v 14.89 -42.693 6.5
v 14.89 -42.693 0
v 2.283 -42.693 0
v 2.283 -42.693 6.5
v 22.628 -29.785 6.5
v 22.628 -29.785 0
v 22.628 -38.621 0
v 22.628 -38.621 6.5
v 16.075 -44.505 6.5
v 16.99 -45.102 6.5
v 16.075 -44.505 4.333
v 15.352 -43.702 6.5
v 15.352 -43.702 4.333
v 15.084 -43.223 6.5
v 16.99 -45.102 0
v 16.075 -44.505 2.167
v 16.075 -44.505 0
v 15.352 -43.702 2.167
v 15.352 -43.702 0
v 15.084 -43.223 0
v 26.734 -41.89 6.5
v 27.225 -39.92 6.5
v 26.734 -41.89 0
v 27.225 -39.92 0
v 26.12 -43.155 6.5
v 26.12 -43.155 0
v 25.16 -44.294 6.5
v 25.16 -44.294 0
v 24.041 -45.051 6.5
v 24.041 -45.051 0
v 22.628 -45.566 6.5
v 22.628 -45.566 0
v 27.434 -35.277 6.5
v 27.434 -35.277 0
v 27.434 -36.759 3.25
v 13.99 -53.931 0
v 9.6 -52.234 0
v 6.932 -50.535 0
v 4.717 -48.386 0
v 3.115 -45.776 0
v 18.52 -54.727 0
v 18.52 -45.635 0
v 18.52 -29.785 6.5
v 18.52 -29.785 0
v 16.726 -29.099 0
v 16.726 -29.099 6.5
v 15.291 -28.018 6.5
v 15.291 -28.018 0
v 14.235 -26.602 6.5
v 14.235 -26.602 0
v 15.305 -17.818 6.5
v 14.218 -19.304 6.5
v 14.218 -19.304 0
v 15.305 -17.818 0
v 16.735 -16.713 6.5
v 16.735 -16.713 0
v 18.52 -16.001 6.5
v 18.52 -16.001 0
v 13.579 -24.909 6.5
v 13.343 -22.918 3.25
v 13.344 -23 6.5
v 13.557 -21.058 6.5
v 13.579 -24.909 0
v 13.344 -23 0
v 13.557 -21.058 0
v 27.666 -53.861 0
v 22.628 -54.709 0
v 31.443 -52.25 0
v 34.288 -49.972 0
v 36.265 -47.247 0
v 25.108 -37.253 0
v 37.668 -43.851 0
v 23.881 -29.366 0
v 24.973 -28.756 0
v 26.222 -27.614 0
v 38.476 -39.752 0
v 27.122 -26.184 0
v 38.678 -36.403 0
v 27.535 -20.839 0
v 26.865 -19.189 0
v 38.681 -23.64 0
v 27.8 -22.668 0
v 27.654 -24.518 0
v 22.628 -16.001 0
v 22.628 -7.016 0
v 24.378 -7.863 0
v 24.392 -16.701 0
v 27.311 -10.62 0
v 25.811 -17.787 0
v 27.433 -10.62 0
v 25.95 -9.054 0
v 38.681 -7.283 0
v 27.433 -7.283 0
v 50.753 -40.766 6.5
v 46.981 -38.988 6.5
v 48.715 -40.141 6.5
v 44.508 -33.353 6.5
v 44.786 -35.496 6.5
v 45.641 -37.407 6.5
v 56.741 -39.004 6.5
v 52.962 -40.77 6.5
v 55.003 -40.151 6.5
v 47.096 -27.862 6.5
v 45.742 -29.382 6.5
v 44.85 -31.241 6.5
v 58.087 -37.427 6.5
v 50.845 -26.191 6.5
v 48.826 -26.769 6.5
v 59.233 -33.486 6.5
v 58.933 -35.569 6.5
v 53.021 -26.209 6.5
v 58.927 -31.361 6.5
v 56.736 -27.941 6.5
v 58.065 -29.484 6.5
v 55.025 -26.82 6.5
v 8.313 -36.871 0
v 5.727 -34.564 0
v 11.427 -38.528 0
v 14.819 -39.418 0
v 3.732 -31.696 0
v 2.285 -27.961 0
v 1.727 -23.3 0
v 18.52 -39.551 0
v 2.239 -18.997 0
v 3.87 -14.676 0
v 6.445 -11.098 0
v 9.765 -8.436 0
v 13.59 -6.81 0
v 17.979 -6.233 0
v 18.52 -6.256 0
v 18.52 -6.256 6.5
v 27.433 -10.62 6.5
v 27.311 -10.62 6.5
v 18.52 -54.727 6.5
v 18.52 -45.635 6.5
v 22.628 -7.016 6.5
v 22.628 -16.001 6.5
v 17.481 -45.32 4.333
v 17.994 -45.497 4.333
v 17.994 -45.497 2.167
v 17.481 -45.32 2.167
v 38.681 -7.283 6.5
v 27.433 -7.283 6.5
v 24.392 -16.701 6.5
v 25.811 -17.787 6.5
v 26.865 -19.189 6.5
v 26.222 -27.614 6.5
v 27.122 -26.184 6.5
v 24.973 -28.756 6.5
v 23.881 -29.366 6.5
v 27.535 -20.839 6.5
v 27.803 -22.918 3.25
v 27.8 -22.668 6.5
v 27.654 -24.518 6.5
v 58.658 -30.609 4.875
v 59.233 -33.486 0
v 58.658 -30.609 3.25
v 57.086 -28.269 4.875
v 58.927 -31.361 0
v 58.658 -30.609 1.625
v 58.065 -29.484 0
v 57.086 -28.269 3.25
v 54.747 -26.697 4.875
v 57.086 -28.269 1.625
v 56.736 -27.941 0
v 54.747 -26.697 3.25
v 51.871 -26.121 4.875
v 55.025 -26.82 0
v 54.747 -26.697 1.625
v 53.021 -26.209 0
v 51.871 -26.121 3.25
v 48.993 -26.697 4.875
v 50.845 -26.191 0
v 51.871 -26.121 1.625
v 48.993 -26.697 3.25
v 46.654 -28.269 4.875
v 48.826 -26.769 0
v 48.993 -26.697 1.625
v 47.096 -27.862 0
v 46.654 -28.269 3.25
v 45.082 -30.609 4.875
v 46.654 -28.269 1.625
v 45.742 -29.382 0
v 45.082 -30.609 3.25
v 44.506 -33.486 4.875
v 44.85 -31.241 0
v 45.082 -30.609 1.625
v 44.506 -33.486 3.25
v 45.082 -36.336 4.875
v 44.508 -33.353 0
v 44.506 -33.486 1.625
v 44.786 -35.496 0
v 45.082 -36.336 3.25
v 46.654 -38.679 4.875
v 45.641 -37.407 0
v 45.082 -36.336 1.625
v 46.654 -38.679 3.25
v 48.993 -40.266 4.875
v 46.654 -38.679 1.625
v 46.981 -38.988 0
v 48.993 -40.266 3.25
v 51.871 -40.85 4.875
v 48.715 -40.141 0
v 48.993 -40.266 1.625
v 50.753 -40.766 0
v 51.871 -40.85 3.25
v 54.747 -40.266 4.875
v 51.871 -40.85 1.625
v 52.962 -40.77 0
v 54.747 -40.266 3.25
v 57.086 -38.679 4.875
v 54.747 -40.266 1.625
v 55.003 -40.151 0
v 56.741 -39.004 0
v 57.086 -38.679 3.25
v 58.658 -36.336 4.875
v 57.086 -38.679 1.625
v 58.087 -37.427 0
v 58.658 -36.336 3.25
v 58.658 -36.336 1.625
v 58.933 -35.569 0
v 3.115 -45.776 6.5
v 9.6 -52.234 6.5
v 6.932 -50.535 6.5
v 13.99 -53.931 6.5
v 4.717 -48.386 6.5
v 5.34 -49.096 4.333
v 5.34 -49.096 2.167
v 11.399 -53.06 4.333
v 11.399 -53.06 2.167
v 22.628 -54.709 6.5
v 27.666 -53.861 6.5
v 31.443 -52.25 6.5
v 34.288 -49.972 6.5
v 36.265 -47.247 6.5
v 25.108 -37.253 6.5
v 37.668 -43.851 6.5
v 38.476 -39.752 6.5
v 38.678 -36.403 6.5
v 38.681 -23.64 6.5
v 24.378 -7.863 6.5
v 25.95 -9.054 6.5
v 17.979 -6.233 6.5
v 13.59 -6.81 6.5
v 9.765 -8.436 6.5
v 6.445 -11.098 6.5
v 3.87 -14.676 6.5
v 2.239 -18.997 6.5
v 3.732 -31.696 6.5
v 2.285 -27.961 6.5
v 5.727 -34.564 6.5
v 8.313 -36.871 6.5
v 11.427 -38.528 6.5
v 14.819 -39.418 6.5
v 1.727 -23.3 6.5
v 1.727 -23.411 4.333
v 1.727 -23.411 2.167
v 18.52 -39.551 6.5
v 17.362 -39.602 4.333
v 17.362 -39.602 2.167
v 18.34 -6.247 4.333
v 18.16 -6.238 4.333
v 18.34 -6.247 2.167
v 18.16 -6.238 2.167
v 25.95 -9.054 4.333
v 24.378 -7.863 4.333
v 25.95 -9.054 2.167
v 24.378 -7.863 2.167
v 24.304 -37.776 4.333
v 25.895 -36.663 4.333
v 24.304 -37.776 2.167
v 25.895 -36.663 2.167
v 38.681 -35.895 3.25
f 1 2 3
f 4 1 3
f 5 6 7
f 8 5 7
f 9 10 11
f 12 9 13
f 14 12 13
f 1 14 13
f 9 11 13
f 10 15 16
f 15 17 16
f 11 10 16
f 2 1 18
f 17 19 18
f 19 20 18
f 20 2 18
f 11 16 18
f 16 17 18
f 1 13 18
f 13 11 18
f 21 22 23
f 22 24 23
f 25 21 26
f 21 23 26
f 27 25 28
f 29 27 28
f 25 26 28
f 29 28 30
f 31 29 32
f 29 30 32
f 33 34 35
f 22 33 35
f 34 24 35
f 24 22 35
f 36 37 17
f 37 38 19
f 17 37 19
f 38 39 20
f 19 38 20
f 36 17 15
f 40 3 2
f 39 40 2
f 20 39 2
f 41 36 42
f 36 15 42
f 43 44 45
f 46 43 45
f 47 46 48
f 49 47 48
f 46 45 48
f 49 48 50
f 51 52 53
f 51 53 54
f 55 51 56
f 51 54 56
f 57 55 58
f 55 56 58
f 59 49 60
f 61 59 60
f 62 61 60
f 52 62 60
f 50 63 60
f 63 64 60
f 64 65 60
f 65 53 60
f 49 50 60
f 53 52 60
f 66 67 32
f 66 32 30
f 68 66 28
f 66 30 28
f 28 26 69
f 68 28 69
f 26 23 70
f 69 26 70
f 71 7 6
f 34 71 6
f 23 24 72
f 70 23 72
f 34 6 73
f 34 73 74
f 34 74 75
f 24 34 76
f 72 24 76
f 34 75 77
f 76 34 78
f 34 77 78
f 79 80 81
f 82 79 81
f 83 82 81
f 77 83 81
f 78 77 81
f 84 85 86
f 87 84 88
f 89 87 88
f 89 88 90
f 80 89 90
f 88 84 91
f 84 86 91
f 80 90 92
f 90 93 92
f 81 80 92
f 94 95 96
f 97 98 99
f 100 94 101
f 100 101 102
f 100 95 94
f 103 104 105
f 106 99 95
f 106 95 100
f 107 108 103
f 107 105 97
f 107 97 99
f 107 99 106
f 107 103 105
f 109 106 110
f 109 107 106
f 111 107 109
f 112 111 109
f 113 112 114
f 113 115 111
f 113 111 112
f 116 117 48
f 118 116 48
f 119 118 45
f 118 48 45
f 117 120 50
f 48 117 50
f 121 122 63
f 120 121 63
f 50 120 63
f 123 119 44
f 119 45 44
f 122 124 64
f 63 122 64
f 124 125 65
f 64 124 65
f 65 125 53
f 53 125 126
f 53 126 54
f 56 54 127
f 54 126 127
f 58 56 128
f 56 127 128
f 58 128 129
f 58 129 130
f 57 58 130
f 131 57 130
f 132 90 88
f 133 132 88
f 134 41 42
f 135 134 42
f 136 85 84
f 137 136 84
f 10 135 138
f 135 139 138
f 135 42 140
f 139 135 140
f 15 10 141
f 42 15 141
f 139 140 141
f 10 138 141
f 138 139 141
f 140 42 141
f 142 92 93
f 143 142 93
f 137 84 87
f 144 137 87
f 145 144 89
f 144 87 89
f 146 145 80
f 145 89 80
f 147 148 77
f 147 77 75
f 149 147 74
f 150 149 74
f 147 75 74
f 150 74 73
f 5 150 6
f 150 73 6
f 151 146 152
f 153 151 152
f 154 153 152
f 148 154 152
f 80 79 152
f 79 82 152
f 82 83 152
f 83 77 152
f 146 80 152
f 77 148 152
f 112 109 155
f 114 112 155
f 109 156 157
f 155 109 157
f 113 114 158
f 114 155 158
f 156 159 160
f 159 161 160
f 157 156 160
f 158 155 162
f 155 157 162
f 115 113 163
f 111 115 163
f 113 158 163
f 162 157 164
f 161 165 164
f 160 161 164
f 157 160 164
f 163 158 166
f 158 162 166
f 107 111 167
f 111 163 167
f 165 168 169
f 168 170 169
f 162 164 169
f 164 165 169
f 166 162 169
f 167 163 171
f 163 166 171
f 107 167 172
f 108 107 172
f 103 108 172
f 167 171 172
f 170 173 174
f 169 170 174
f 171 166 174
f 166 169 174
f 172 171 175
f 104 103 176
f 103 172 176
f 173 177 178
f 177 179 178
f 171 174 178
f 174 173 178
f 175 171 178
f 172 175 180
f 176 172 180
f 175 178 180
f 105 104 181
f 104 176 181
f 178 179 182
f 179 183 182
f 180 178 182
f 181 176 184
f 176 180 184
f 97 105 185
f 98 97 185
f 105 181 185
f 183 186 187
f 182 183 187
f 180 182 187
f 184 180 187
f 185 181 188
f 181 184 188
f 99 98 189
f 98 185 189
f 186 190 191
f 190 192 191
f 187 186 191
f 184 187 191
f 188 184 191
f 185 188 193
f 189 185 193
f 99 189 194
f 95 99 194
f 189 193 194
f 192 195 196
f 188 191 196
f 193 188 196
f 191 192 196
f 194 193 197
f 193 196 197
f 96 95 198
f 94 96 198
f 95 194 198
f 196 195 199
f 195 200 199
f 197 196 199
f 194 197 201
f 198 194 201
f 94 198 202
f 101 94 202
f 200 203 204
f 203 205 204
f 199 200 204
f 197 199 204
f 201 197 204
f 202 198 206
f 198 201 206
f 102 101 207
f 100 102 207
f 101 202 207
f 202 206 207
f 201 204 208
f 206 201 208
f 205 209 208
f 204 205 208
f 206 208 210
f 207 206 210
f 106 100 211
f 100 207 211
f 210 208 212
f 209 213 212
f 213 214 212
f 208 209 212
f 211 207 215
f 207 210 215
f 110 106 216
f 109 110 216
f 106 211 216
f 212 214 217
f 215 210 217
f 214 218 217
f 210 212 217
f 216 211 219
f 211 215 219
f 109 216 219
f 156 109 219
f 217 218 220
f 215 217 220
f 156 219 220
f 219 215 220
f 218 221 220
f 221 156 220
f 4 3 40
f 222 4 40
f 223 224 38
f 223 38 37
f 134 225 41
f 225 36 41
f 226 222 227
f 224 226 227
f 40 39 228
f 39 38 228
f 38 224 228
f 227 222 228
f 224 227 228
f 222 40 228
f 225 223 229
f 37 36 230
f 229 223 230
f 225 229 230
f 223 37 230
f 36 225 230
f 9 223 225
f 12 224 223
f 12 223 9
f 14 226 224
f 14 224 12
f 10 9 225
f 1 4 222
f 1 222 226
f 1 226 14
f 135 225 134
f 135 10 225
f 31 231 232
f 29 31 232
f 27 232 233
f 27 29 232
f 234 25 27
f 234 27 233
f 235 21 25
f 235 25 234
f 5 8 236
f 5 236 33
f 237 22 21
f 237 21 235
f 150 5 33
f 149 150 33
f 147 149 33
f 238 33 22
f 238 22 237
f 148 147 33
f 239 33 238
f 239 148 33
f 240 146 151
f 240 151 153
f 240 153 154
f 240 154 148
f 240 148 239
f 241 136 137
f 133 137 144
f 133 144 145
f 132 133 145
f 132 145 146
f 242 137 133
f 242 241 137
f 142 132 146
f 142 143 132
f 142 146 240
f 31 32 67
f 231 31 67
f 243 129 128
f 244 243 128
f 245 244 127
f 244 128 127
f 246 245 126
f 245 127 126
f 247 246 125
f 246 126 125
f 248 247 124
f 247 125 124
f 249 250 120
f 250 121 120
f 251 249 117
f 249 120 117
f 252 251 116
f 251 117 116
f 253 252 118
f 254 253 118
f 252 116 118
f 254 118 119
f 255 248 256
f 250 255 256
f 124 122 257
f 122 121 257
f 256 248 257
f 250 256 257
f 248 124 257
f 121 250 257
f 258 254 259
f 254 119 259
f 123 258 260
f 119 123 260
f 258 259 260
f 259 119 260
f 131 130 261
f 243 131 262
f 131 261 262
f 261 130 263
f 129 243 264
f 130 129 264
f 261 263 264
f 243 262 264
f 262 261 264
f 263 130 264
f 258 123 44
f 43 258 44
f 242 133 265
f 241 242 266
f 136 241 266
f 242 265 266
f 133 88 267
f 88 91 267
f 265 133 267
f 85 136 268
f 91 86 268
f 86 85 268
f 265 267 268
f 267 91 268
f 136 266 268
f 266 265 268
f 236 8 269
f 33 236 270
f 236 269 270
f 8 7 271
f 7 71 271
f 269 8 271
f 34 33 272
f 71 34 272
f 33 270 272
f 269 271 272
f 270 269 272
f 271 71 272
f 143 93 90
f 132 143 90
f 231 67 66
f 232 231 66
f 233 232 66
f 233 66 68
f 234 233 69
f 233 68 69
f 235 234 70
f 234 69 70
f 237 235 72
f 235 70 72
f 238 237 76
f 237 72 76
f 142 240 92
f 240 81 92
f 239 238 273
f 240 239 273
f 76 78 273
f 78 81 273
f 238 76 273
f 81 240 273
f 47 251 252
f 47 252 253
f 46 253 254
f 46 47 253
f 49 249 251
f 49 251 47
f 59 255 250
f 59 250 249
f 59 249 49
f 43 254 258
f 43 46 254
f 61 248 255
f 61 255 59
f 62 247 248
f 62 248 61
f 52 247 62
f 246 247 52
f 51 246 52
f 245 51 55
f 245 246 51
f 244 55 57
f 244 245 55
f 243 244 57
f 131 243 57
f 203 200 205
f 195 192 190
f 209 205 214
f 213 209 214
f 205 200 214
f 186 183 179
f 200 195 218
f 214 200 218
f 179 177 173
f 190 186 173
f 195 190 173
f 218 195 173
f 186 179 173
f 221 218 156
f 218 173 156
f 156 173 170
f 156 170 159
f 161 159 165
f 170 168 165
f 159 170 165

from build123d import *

# Parameters (mm, degrees)
EXTRUDE001_DEPTH = 6.5
EXTRUDE_DEPTH    = 6.5


with BuildPart() as extrude001:
    # Sketch004 → Extrude001 (new body)
    with BuildSketch(Plane.XY):
        with BuildLine():
            add(Edge.make_bspline(
                [(51.870751, -26.121078), (47.777964, -26.121078), (44.506444, -29.395138), (44.506444, -33.485949)],
                knots=[0, 0, 0, 0, 1, 1, 1, 1], degree=3))
            add(Edge.make_bspline(
                [(44.506444, -33.485949), (44.506444, -37.513824), (47.777964, -40.850256), (51.870751, -40.850256)],
                knots=[0, 0, 0, 0, 1, 1, 1, 1], degree=3))
            add(Edge.make_bspline(
                [(51.870751, -40.850256), (55.962127, -40.850256), (59.233364, -37.514107), (59.233364, -33.485949)],
                knots=[0, 0, 0, 0, 1, 1, 1, 1], degree=3))
            add(Edge.make_bspline(
                [(59.233364, -33.485949), (59.233364, -29.395138), (55.962127, -26.121078), (51.870751, -26.121078)],
                knots=[0, 0, 0, 0, 1, 1, 1, 1], degree=3))
        make_face()
        with BuildLine():
            add(Edge.make_bspline(
                [(14.889762, -42.692884), (2.282896, -42.692884)],
                knots=[0, 0, 44.67, 44.67], degree=1))
            add(Edge.make_bspline(
                [(2.282896, -42.692884), (3.193062, -50.361427), (11.514667, -54.163242), (18.519987, -54.726558)],
                knots=[0, 0, 0, 0, 1, 1, 1, 1], degree=3))
            add(Edge.make_bspline(
                [(18.519987, -54.726558), (18.519987, -45.635333)],
                knots=[0, 0, 32.213, 32.213], degree=1))
            add(Edge.make_bspline(
                [(18.519987, -45.635333), (17.989691, -45.514824), (17.468427, -45.341258), (16.99006, -45.101933)],
                knots=[0, 0, 0, 0, 1, 1, 1, 1], degree=3))
            add(Edge.make_bspline(
                [(16.99006, -45.101933), (16.001436, -44.608609), (15.198513, -43.803993), (14.889762, -42.692884)],
                knots=[0, 0, 0, 0, 1, 1, 1, 1], degree=3))
        make_face()
        with BuildLine():
            add(Edge.make_bspline(
                [(1.726918, -23.41118), (1.726918, -32.558002), (8.09244, -39.602269), (17.362029, -39.602269)],
                knots=[0, 0, 0, 0, 1, 1, 1, 1], degree=3))
            add(Edge.make_bspline(
                [(17.362029, -39.602269), (17.761656, -39.602269), (18.143784, -39.580538), (18.520269, -39.551187)],
                knots=[0, 0, 0, 0, 1, 1, 1, 1], degree=3))
            add(Edge.make_bspline(
                [(18.520269, -39.551187), (18.520269, -29.785451)],
                knots=[0, 0, 34.603, 34.603], degree=1))
            add(Edge.make_bspline(
                [(18.520269, -29.785451), (15.216576, -28.997204), (13.343467, -26.286178), (13.343467, -22.918138)],
                knots=[0, 0, 0, 0, 1, 1, 1, 1], degree=3))
            add(Edge.make_bspline(
                [(13.343467, -22.918138), (13.343467, -19.652262), (15.216576, -16.829476), (18.519987, -16.001436)],
                knots=[0, 0, 0, 0, 1, 1, 1, 1], degree=3))
            add(Edge.make_bspline(
                [(18.519987, -16.001436), (18.519987, -6.255738)],
                knots=[0, 0, 34.532, 34.532], degree=1))
            add(Edge.make_bspline(
                [(18.519987, -6.255738), (18.339647, -6.248964), (18.160718, -6.23316), (17.978967, -6.23316)],
                knots=[0, 0, 0, 0, 1, 1, 1, 1], degree=3))
            add(Edge.make_bspline(
                [(17.978967, -6.23316), (8.277296, -6.232878), (1.726918, -14.142438), (1.726918, -23.41118)],
                knots=[0, 0, 0, 0, 1, 1, 1, 1], degree=3))
        make_face()
        with BuildLine():
            add(Edge.make_bspline(
                [(27.433411, -10.61974), (27.310644, -10.61974)],
                knots=[0, 0, 0.435, 0.435], degree=1))
            add(Edge.make_bspline(
                [(27.310644, -10.61974), (26.067173, -8.857262), (24.455684, -7.699869), (22.627731, -7.016327)],
                knots=[0, 0, 0, 0, 1, 1, 1, 1], degree=3))
            add(Edge.make_bspline(
                [(22.627731, -7.016327), (22.627731, -16.001153)],
                knots=[0, 0, 31.836, 31.836], degree=1))
            add(Edge.make_bspline(
                [(22.627731, -16.001153), (25.929449, -16.829193), (27.803404, -19.65198), (27.803404, -22.917856)],
                knots=[0, 0, 0, 0, 1, 1, 1, 1], degree=3))
            add(Edge.make_bspline(
                [(27.803404, -22.917856), (27.803404, -26.285896), (25.929449, -28.996076), (22.627731, -29.785169)],
                knots=[0, 0, 0, 0, 1, 1, 1, 1], degree=3))
            add(Edge.make_bspline(
                [(22.627731, -29.785169), (22.627731, -38.620982)],
                knots=[0, 0, 31.308, 31.308], degree=1))
            add(Edge.make_bspline(
                [(22.627731, -38.620982), (24.359164, -37.907242), (25.909129, -36.802624), (27.433693, -35.276649)],
                knots=[0, 0, 0, 0, 1, 1, 1, 1], degree=3))
            add(Edge.make_bspline(
                [(27.433693, -35.276649), (27.433693, -36.75888)],
                knots=[0, 0, 5.252, 5.252], degree=1))
            add(Edge.make_bspline(
                [(27.433693, -36.75888), (27.433693, -41.106796), (26.575738, -44.599013), (22.627731, -45.565624)],
                knots=[0, 0, 0, 0, 1, 1, 1, 1], degree=3))
            add(Edge.make_bspline(
                [(22.627731, -45.565624), (22.627731, -54.70906)],
                knots=[0, 0, 32.398, 32.398], degree=1))
            add(Edge.make_bspline(
                [(22.627731, -54.70906), (32.869293, -54.008584), (38.681096, -48.448524), (38.681096, -35.894998)],
                knots=[0, 0, 0, 0, 1, 1, 1, 1], degree=3))
            add(Edge.make_bspline(
                [(38.681096, -35.894998), (38.681096, -7.282744)],
                knots=[0, 0, 101.382, 101.382], degree=1))
            add(Edge.make_bspline(
                [(38.681096, -7.282744), (27.433411, -7.282744)],
                knots=[0, 0, 39.854, 39.854], degree=1))
            add(Edge.make_bspline(
                [(27.433411, -7.282744), (27.433411, -10.61974)],
                knots=[0, 0, 11.824, 11.824], degree=1))
        make_face()
    extrude(amount=EXTRUDE001_DEPTH)


with BuildPart() as fusion:
    # Sketch004 → Extrude (new body)
    with BuildSketch(Plane.XY):
        with BuildLine():
            add(Edge.make_bspline(
                [(51.870751, -26.121078), (47.777964, -26.121078), (44.506444, -29.395138), (44.506444, -33.485949)],
                knots=[0, 0, 0, 0, 1, 1, 1, 1], degree=3))
            add(Edge.make_bspline(
                [(44.506444, -33.485949), (44.506444, -37.513824), (47.777964, -40.850256), (51.870751, -40.850256)],
                knots=[0, 0, 0, 0, 1, 1, 1, 1], degree=3))
            add(Edge.make_bspline(
                [(51.870751, -40.850256), (55.962127, -40.850256), (59.233364, -37.514107), (59.233364, -33.485949)],
                knots=[0, 0, 0, 0, 1, 1, 1, 1], degree=3))
            add(Edge.make_bspline(
                [(59.233364, -33.485949), (59.233364, -29.395138), (55.962127, -26.121078), (51.870751, -26.121078)],
                knots=[0, 0, 0, 0, 1, 1, 1, 1], degree=3))
        make_face()
        with BuildLine():
            add(Edge.make_bspline(
                [(14.889762, -42.692884), (2.282896, -42.692884)],
                knots=[0, 0, 44.67, 44.67], degree=1))
            add(Edge.make_bspline(
                [(2.282896, -42.692884), (3.193062, -50.361427), (11.514667, -54.163242), (18.519987, -54.726558)],
                knots=[0, 0, 0, 0, 1, 1, 1, 1], degree=3))
            add(Edge.make_bspline(
                [(18.519987, -54.726558), (18.519987, -45.635333)],
                knots=[0, 0, 32.213, 32.213], degree=1))
            add(Edge.make_bspline(
                [(18.519987, -45.635333), (17.989691, -45.514824), (17.468427, -45.341258), (16.99006, -45.101933)],
                knots=[0, 0, 0, 0, 1, 1, 1, 1], degree=3))
            add(Edge.make_bspline(
                [(16.99006, -45.101933), (16.001436, -44.608609), (15.198513, -43.803993), (14.889762, -42.692884)],
                knots=[0, 0, 0, 0, 1, 1, 1, 1], degree=3))
        make_face()
        with BuildLine():
            add(Edge.make_bspline(
                [(1.726918, -23.41118), (1.726918, -32.558002), (8.09244, -39.602269), (17.362029, -39.602269)],
                knots=[0, 0, 0, 0, 1, 1, 1, 1], degree=3))
            add(Edge.make_bspline(
                [(17.362029, -39.602269), (17.761656, -39.602269), (18.143784, -39.580538), (18.520269, -39.551187)],
                knots=[0, 0, 0, 0, 1, 1, 1, 1], degree=3))
            add(Edge.make_bspline(
                [(18.520269, -39.551187), (18.520269, -29.785451)],
                knots=[0, 0, 34.603, 34.603], degree=1))
            add(Edge.make_bspline(
                [(18.520269, -29.785451), (15.216576, -28.997204), (13.343467, -26.286178), (13.343467, -22.918138)],
                knots=[0, 0, 0, 0, 1, 1, 1, 1], degree=3))
            add(Edge.make_bspline(
                [(13.343467, -22.918138), (13.343467, -19.652262), (15.216576, -16.829476), (18.519987, -16.001436)],
                knots=[0, 0, 0, 0, 1, 1, 1, 1], degree=3))
            add(Edge.make_bspline(
                [(18.519987, -16.001436), (18.519987, -6.255738)],
                knots=[0, 0, 34.532, 34.532], degree=1))
            add(Edge.make_bspline(
                [(18.519987, -6.255738), (18.339647, -6.248964), (18.160718, -6.23316), (17.978967, -6.23316)],
                knots=[0, 0, 0, 0, 1, 1, 1, 1], degree=3))
            add(Edge.make_bspline(
                [(17.978967, -6.23316), (8.277296, -6.232878), (1.726918, -14.142438), (1.726918, -23.41118)],
                knots=[0, 0, 0, 0, 1, 1, 1, 1], degree=3))
        make_face()
        with BuildLine():
            add(Edge.make_bspline(
                [(27.433411, -10.61974), (27.310644, -10.61974)],
                knots=[0, 0, 0.435, 0.435], degree=1))
            add(Edge.make_bspline(
                [(27.310644, -10.61974), (26.067173, -8.857262), (24.455684, -7.699869), (22.627731, -7.016327)],
                knots=[0, 0, 0, 0, 1, 1, 1, 1], degree=3))
            add(Edge.make_bspline(
                [(22.627731, -7.016327), (22.627731, -16.001153)],
                knots=[0, 0, 31.836, 31.836], degree=1))
            add(Edge.make_bspline(
                [(22.627731, -16.001153), (25.929449, -16.829193), (27.803404, -19.65198), (27.803404, -22.917856)],
                knots=[0, 0, 0, 0, 1, 1, 1, 1], degree=3))
            add(Edge.make_bspline(
                [(27.803404, -22.917856), (27.803404, -26.285896), (25.929449, -28.996076), (22.627731, -29.785169)],
                knots=[0, 0, 0, 0, 1, 1, 1, 1], degree=3))
            add(Edge.make_bspline(
                [(22.627731, -29.785169), (22.627731, -38.620982)],
                knots=[0, 0, 31.308, 31.308], degree=1))
            add(Edge.make_bspline(
                [(22.627731, -38.620982), (24.359164, -37.907242), (25.909129, -36.802624), (27.433693, -35.276649)],
                knots=[0, 0, 0, 0, 1, 1, 1, 1], degree=3))
            add(Edge.make_bspline(
                [(27.433693, -35.276649), (27.433693, -36.75888)],
                knots=[0, 0, 5.252, 5.252], degree=1))
            add(Edge.make_bspline(
                [(27.433693, -36.75888), (27.433693, -41.106796), (26.575738, -44.599013), (22.627731, -45.565624)],
                knots=[0, 0, 0, 0, 1, 1, 1, 1], degree=3))
            add(Edge.make_bspline(
                [(22.627731, -45.565624), (22.627731, -54.70906)],
                knots=[0, 0, 32.398, 32.398], degree=1))
            add(Edge.make_bspline(
                [(22.627731, -54.70906), (32.869293, -54.008584), (38.681096, -48.448524), (38.681096, -35.894998)],
                knots=[0, 0, 0, 0, 1, 1, 1, 1], degree=3))
            add(Edge.make_bspline(
                [(38.681096, -35.894998), (38.681096, -7.282744)],
                knots=[0, 0, 101.382, 101.382], degree=1))
            add(Edge.make_bspline(
                [(38.681096, -7.282744), (27.433411, -7.282744)],
                knots=[0, 0, 39.854, 39.854], degree=1))
            add(Edge.make_bspline(
                [(27.433411, -7.282744), (27.433411, -10.61974)],
                knots=[0, 0, 11.824, 11.824], degree=1))
        make_face()
    extrude(amount=EXTRUDE_DEPTH)

    # Fusion: union Extrude001
    add(extrude001.part)


solid = fusion.part
